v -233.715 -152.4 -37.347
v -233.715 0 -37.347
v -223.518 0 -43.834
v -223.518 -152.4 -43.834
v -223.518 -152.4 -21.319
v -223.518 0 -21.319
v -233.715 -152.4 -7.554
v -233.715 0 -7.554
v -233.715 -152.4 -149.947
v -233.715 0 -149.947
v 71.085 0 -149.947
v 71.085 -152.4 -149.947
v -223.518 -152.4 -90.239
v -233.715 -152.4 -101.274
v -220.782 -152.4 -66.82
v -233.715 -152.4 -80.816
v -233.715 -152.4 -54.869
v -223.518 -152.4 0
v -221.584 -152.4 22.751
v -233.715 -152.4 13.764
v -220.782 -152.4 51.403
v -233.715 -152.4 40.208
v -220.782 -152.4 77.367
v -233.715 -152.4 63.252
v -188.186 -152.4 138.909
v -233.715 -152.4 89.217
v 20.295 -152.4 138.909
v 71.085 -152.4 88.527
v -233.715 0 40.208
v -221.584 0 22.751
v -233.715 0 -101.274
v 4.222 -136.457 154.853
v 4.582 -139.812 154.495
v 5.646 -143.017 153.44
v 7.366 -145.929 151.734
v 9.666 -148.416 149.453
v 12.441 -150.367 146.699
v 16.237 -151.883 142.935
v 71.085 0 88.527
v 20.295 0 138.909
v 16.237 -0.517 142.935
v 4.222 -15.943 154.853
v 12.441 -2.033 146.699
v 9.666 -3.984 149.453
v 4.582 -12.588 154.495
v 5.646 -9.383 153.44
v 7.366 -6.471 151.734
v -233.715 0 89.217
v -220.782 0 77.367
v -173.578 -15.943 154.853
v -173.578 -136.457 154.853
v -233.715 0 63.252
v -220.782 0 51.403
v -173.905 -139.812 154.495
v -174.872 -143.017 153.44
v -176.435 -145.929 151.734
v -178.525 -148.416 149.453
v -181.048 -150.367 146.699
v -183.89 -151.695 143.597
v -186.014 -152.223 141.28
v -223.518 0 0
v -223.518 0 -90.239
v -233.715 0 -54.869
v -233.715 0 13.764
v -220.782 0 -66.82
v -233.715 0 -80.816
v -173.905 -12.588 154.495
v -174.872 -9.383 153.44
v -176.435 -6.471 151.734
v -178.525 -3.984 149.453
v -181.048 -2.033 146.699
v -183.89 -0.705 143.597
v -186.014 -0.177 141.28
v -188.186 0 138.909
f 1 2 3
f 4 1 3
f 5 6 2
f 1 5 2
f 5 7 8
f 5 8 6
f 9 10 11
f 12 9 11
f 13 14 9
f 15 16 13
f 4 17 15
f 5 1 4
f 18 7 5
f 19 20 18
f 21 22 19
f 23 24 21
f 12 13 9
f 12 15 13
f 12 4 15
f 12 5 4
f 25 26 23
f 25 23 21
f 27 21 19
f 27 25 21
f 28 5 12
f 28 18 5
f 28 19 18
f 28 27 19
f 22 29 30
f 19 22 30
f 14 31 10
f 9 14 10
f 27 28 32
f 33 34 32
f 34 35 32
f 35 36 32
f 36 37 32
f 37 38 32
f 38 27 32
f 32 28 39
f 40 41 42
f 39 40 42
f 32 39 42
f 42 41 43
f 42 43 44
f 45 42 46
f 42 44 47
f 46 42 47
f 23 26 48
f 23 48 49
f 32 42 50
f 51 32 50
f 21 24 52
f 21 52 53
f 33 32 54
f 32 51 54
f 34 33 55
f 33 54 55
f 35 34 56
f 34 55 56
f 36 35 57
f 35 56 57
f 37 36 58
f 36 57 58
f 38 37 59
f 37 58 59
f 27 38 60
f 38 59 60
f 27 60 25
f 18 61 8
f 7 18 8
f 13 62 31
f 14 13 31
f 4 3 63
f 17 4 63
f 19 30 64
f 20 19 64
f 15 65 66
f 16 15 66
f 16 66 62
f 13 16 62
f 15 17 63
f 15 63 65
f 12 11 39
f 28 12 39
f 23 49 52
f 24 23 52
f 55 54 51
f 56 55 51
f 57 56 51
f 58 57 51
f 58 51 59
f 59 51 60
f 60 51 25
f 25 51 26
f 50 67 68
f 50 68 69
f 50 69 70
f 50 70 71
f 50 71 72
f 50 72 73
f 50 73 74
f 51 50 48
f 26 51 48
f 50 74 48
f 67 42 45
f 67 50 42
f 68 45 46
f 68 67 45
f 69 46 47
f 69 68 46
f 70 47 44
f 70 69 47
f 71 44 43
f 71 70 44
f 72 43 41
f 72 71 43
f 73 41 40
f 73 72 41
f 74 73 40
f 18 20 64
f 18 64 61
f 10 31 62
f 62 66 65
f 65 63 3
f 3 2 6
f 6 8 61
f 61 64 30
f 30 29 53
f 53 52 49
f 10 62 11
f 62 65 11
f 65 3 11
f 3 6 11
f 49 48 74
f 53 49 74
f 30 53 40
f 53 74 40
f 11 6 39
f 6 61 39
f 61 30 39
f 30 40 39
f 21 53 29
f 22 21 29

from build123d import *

# Parameters (mm, degrees)
F1_DEPTH = 152.4
F2_R     = 15.9434663659


# Not quite as in the source:
# - a feature names something its author has since deleted; it is built from what else it names


with BuildPart() as f1:
    # F0 (on Front) → F1 (new body)
    with BuildSketch(Plane.XZ):
        Polygon((-233.7148142715, -101.2738309481), (-233.7148142715, -149.9473750383), (71.0851857285, -149.9473750383), (71.0851857285, 44.3499535322), (71.0851857285, 88.5266363621), (4.2222592115, 154.8526249617), (-173.5777407885, 154.8526249617), (-233.7148142715, 89.2168954015), (-220.7819144912, 77.3674537994), (-233.7148142715, 63.2520294323), (-220.7819144912, 51.4025878302), (-233.7148142715, 40.2083918452), (-221.5843061602, 22.7510556579), (-233.7148142715, 13.7644242495), (-223.5177305101, 0), (-233.7148142715, -7.5542947057), (-223.5177305101, -21.3187189553), (-233.7148142715, -37.3470336199), (-223.5177305101, -43.8343355859), (-233.7148142715, -54.8694915965), (-220.7819144912, -66.8201937171), (-233.7148142715, -80.8160154721), (-223.5177305101, -90.2386749375), align=None)
    extrude(amount=F1_DEPTH)

    # F2
    f2_edges = [f1.edges().sort_by_distance(p)[0] for p in [
        (-84.677741, -152.4, 154.852625),
        (-84.677741, 0, 154.852625),
    ]]
    fillet(f2_edges, radius=F2_R)


solid = f1.part
